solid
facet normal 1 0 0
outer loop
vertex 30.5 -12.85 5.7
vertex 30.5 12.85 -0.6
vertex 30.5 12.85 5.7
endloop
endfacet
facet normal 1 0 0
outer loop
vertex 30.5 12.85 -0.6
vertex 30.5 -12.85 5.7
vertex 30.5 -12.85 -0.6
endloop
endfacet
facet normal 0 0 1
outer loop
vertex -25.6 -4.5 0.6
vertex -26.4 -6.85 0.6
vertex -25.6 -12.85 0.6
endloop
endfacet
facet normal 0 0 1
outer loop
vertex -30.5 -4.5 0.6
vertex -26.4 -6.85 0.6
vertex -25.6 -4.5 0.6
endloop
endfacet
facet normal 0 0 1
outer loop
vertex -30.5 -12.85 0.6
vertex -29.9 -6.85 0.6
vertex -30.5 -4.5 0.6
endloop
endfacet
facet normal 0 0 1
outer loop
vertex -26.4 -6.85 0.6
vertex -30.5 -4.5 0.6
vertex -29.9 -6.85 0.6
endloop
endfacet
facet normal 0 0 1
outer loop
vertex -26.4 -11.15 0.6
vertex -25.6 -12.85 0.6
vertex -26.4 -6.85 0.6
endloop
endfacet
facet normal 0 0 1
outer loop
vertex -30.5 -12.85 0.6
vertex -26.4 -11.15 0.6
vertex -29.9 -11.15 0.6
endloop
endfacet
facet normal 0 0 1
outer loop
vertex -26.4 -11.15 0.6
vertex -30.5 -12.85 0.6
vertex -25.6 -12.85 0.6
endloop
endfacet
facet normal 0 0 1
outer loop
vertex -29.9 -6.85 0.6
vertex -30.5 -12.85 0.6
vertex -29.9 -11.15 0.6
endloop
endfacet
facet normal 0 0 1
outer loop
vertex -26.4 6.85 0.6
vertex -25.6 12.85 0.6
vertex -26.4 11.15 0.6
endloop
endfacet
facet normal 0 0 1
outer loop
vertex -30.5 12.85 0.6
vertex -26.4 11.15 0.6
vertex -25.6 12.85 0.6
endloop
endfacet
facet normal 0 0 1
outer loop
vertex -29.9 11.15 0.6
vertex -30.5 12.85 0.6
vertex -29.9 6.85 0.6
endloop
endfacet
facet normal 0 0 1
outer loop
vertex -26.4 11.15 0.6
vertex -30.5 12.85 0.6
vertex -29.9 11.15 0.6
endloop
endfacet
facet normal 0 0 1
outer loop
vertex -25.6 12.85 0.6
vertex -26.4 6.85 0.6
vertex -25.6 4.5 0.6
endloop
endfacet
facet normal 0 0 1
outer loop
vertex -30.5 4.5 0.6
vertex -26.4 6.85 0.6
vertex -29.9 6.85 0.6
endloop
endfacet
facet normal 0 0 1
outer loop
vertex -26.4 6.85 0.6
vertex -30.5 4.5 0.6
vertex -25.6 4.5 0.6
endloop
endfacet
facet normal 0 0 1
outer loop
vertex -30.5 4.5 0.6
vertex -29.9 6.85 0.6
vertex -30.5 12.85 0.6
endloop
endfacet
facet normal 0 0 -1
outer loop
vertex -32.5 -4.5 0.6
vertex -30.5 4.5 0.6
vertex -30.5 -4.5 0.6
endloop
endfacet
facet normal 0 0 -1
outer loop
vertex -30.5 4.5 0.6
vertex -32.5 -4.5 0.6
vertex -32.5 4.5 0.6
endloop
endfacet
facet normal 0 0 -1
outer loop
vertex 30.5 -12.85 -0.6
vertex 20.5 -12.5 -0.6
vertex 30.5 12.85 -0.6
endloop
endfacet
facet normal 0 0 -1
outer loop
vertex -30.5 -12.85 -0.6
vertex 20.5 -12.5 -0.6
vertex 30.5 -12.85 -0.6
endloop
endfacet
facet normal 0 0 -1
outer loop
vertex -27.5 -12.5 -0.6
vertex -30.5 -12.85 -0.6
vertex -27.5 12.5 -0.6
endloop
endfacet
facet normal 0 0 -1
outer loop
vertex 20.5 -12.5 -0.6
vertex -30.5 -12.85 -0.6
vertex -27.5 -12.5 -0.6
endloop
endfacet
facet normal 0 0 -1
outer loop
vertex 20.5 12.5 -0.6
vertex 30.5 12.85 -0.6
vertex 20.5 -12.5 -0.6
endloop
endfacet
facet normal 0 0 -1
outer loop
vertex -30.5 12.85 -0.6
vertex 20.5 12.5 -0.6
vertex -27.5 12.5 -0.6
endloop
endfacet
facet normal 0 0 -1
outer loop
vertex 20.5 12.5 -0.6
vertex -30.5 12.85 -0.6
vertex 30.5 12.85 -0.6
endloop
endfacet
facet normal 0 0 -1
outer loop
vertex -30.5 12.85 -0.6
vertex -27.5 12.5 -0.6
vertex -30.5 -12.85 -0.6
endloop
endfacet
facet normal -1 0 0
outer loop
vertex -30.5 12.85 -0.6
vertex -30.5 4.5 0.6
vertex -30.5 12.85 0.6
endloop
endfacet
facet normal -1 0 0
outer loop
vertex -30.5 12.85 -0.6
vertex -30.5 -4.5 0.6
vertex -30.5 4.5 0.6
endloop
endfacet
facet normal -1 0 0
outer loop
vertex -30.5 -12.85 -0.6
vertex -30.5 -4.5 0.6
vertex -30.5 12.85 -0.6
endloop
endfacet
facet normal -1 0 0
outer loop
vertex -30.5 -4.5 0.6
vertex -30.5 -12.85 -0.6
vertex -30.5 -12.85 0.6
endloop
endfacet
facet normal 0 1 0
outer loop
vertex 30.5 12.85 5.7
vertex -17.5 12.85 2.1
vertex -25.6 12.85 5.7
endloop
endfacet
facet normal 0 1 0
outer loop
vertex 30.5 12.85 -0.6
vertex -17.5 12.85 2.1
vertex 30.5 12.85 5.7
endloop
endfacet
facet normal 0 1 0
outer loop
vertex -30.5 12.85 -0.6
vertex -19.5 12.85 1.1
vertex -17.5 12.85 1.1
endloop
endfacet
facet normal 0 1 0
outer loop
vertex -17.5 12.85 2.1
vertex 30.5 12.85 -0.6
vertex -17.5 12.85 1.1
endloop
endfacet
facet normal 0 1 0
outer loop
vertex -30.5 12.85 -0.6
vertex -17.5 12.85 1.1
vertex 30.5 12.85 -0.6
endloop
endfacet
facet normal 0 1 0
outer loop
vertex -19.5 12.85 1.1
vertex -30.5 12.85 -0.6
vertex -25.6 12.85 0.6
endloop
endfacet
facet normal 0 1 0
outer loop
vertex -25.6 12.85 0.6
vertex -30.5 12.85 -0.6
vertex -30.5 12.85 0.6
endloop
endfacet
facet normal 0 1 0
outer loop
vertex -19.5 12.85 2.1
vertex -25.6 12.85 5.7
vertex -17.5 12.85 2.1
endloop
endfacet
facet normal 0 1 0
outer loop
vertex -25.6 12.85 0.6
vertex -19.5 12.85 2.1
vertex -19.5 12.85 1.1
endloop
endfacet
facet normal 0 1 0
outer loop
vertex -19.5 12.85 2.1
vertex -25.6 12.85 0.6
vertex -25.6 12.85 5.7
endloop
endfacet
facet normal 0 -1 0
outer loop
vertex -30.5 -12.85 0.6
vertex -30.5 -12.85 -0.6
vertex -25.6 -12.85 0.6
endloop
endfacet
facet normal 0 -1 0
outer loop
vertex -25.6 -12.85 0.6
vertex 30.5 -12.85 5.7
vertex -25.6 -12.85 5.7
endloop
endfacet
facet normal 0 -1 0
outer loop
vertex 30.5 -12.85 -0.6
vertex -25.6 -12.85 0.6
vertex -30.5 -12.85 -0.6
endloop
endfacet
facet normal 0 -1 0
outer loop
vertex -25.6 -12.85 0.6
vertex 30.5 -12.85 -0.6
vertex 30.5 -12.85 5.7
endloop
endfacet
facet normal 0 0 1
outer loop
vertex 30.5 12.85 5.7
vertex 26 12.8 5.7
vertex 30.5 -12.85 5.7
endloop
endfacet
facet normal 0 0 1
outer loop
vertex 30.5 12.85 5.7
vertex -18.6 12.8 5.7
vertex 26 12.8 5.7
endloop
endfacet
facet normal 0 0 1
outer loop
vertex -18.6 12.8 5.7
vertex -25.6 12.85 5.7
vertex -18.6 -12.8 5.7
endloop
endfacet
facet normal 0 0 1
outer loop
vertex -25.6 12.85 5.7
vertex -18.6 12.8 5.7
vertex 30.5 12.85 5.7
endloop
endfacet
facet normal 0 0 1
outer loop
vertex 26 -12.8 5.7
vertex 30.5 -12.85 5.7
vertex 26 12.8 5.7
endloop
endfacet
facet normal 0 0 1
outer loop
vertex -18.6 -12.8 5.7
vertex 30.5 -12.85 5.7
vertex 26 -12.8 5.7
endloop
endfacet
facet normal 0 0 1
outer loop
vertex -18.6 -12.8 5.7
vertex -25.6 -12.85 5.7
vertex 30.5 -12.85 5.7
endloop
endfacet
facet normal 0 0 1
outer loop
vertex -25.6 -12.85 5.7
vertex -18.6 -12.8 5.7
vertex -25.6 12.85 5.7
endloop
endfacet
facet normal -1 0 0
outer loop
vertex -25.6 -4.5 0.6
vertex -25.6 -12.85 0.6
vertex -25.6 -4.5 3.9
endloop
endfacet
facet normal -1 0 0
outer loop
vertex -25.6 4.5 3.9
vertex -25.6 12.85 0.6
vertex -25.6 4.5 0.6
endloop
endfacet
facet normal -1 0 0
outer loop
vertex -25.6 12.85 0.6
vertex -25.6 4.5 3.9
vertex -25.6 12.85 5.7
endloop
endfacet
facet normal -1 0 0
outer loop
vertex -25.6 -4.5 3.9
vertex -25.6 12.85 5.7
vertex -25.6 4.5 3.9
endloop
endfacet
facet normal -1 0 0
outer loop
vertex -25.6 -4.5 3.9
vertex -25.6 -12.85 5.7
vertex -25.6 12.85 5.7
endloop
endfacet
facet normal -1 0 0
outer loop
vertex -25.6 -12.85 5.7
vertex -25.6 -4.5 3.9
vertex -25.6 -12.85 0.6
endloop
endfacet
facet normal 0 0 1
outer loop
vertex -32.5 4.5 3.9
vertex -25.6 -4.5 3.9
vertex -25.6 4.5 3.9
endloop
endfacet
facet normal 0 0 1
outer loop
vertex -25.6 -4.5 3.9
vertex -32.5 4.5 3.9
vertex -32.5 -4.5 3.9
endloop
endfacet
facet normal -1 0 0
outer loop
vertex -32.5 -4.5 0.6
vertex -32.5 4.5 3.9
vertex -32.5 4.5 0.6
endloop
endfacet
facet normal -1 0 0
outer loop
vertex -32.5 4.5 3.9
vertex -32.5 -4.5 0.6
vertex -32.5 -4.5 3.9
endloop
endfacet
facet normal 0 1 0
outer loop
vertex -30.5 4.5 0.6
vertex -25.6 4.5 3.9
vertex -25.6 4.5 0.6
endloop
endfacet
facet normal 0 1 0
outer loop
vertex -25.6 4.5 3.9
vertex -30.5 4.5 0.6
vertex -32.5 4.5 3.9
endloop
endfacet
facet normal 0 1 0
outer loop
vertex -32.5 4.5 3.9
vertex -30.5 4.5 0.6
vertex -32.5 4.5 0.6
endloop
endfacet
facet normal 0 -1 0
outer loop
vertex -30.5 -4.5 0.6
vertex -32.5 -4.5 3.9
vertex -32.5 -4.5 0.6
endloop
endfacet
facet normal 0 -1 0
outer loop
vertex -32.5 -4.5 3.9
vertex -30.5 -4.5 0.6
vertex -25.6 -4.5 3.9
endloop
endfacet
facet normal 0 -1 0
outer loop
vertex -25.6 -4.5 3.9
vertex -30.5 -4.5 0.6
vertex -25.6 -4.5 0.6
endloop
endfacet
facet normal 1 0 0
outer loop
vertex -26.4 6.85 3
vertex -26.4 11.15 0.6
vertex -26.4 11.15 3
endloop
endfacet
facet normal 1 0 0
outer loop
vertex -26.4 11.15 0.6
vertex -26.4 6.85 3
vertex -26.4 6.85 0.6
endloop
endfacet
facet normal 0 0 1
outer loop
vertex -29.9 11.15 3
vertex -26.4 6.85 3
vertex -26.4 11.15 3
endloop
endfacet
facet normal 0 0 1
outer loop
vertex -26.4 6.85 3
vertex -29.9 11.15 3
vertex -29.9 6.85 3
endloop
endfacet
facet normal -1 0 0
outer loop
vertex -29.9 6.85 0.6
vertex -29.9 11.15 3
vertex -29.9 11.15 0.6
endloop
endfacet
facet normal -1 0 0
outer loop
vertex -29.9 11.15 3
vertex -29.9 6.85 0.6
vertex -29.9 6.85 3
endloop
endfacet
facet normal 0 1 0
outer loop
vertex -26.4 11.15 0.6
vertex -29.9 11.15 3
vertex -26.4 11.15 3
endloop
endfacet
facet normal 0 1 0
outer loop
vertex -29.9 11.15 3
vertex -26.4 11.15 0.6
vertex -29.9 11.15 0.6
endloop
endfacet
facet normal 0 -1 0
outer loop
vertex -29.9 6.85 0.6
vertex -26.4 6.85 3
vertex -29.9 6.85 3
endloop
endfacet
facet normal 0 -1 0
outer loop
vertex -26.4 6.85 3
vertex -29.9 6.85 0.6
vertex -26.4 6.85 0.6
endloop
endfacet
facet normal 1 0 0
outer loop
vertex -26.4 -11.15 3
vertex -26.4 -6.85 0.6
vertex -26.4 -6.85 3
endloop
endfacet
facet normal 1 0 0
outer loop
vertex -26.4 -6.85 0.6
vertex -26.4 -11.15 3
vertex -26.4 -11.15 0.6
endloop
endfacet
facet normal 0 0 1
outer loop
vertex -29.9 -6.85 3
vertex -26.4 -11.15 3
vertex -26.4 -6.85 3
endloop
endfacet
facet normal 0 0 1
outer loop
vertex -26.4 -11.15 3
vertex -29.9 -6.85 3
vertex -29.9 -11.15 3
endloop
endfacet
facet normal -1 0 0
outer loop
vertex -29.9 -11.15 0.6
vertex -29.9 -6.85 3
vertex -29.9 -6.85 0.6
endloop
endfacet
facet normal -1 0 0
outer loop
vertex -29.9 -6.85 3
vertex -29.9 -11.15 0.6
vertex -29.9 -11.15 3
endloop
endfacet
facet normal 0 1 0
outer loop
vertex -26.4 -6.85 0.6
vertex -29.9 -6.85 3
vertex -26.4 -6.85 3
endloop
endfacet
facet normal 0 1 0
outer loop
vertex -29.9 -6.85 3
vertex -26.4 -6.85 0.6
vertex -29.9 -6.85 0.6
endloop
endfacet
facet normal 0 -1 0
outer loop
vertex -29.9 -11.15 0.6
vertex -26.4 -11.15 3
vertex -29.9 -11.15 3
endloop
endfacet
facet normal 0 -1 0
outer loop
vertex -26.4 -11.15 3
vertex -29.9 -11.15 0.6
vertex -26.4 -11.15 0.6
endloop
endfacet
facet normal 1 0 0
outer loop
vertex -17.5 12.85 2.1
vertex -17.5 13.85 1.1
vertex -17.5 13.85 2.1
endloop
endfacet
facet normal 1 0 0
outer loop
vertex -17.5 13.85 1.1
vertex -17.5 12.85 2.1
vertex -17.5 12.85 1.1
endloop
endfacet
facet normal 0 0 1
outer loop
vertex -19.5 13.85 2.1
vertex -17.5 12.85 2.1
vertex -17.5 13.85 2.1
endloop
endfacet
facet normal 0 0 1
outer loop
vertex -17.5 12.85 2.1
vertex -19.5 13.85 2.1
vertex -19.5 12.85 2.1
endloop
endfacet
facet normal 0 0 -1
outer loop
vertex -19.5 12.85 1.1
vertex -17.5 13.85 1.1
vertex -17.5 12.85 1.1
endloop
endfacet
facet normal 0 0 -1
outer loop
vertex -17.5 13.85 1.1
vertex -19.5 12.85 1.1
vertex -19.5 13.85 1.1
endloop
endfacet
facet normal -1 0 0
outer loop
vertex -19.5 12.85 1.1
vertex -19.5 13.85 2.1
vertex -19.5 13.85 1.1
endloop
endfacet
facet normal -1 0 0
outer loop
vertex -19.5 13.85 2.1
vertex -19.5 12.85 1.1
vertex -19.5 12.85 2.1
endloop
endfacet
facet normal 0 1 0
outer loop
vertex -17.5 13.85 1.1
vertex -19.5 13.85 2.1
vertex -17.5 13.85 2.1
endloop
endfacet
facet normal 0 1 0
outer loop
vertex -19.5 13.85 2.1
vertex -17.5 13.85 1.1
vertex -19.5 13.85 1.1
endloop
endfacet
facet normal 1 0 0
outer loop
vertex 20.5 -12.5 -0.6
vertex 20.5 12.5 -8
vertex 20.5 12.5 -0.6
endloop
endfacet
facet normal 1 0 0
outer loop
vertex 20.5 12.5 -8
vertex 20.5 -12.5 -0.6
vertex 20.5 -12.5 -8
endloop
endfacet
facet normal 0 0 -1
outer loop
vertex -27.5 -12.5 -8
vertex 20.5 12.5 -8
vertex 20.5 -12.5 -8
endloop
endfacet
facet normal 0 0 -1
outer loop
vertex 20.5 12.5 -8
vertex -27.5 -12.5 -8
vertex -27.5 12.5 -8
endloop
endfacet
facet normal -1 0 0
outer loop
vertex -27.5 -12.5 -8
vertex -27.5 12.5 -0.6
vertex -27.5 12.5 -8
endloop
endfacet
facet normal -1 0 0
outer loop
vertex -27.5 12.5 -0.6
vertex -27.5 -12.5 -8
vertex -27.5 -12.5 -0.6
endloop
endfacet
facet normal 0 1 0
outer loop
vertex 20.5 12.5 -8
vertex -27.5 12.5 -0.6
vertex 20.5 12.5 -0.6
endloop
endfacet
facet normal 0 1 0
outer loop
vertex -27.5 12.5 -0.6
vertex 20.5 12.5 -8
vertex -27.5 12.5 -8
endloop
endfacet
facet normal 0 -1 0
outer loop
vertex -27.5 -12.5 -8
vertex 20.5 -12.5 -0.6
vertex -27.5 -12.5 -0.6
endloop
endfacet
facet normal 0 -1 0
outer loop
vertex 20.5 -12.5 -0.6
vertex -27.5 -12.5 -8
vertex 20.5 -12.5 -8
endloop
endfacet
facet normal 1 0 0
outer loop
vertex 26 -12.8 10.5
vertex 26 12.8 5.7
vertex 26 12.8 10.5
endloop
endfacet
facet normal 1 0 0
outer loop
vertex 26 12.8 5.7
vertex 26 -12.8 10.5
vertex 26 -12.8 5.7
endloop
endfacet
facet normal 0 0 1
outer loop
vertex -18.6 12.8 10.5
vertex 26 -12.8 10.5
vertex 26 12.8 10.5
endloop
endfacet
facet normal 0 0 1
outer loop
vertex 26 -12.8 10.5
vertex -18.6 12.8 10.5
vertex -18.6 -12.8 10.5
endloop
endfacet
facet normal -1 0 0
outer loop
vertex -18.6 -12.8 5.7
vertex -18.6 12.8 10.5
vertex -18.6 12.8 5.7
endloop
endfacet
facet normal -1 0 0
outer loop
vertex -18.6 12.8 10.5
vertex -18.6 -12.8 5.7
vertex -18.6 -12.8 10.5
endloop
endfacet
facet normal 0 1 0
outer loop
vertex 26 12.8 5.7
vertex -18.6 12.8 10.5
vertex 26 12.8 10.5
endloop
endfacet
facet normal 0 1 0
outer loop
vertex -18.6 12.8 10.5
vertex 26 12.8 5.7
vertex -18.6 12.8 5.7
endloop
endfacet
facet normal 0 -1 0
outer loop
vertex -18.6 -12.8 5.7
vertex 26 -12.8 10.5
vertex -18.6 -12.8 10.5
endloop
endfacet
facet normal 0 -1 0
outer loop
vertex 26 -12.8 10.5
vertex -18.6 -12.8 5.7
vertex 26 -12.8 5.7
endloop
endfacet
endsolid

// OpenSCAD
module esp32_lilygo_t_display_s3() {
    pcb= [61.0,25.7,1.2];
    disp=[56.1,25.7,5.1];
    
    usb=[9,9,3.3]; 
    
    bt=[3.5,4.3,2.4];
    rst=[2,2,1];    
    
    union() {       
      // PCB
      cube(pcb, center=true);           
      // screen        
      translate([(pcb[0]-disp[0])/2,0,(pcb[2]+disp[2])/2])
        cube(disp, center=true);           
        
      // USB
      translate([-(pcb[0]-usb[0])/2-2,0,(pcb[2]+usb[2])/2])
        cube(usb, center=true);    
         
      // buttons
      translate([-(pcb[0]-bt[0])/2+0.6,+9,(pcb[2]+bt[2])/2])        
        cube(bt, center=true);    
      translate([-(pcb[0]-bt[0])/2+0.6,-9,(pcb[2]+bt[2])/2])
        cube(bt, center=true);
      // reset button (other side of the pcb -- +y edge, not -y)
      translate([-pcb[0]/2+12,pcb[1]/2,(pcb[2]+rst[2]+1)/2])
        cube(rst, center=true);
      translate([-pcb[0]/2+12,pcb[1]/2-1,pcb[2]/2+1])
        cube([4,2,2], center=true);
      // safe sapce
      translate([-3.5,0,-4])
        cube([48,25,8], center=true);    
    }
}

module esp32_lilygo_t_display_s3_view() {
  pcb= [61.0,25.7,1.2];
  dispv=[56.1-7-4.5,25.6,10]; // visible
  translate([(pcb[0]-dispv[0])/2-4.5,0,5.5])
    cube(dispv, center=true);   
}



color("#30AA30")
rotate([0,0,0])
  esp32_lilygo_t_display_s3();    
color("#30AAAA")
rotate([0,0,0])
  esp32_lilygo_t_display_s3_view();
